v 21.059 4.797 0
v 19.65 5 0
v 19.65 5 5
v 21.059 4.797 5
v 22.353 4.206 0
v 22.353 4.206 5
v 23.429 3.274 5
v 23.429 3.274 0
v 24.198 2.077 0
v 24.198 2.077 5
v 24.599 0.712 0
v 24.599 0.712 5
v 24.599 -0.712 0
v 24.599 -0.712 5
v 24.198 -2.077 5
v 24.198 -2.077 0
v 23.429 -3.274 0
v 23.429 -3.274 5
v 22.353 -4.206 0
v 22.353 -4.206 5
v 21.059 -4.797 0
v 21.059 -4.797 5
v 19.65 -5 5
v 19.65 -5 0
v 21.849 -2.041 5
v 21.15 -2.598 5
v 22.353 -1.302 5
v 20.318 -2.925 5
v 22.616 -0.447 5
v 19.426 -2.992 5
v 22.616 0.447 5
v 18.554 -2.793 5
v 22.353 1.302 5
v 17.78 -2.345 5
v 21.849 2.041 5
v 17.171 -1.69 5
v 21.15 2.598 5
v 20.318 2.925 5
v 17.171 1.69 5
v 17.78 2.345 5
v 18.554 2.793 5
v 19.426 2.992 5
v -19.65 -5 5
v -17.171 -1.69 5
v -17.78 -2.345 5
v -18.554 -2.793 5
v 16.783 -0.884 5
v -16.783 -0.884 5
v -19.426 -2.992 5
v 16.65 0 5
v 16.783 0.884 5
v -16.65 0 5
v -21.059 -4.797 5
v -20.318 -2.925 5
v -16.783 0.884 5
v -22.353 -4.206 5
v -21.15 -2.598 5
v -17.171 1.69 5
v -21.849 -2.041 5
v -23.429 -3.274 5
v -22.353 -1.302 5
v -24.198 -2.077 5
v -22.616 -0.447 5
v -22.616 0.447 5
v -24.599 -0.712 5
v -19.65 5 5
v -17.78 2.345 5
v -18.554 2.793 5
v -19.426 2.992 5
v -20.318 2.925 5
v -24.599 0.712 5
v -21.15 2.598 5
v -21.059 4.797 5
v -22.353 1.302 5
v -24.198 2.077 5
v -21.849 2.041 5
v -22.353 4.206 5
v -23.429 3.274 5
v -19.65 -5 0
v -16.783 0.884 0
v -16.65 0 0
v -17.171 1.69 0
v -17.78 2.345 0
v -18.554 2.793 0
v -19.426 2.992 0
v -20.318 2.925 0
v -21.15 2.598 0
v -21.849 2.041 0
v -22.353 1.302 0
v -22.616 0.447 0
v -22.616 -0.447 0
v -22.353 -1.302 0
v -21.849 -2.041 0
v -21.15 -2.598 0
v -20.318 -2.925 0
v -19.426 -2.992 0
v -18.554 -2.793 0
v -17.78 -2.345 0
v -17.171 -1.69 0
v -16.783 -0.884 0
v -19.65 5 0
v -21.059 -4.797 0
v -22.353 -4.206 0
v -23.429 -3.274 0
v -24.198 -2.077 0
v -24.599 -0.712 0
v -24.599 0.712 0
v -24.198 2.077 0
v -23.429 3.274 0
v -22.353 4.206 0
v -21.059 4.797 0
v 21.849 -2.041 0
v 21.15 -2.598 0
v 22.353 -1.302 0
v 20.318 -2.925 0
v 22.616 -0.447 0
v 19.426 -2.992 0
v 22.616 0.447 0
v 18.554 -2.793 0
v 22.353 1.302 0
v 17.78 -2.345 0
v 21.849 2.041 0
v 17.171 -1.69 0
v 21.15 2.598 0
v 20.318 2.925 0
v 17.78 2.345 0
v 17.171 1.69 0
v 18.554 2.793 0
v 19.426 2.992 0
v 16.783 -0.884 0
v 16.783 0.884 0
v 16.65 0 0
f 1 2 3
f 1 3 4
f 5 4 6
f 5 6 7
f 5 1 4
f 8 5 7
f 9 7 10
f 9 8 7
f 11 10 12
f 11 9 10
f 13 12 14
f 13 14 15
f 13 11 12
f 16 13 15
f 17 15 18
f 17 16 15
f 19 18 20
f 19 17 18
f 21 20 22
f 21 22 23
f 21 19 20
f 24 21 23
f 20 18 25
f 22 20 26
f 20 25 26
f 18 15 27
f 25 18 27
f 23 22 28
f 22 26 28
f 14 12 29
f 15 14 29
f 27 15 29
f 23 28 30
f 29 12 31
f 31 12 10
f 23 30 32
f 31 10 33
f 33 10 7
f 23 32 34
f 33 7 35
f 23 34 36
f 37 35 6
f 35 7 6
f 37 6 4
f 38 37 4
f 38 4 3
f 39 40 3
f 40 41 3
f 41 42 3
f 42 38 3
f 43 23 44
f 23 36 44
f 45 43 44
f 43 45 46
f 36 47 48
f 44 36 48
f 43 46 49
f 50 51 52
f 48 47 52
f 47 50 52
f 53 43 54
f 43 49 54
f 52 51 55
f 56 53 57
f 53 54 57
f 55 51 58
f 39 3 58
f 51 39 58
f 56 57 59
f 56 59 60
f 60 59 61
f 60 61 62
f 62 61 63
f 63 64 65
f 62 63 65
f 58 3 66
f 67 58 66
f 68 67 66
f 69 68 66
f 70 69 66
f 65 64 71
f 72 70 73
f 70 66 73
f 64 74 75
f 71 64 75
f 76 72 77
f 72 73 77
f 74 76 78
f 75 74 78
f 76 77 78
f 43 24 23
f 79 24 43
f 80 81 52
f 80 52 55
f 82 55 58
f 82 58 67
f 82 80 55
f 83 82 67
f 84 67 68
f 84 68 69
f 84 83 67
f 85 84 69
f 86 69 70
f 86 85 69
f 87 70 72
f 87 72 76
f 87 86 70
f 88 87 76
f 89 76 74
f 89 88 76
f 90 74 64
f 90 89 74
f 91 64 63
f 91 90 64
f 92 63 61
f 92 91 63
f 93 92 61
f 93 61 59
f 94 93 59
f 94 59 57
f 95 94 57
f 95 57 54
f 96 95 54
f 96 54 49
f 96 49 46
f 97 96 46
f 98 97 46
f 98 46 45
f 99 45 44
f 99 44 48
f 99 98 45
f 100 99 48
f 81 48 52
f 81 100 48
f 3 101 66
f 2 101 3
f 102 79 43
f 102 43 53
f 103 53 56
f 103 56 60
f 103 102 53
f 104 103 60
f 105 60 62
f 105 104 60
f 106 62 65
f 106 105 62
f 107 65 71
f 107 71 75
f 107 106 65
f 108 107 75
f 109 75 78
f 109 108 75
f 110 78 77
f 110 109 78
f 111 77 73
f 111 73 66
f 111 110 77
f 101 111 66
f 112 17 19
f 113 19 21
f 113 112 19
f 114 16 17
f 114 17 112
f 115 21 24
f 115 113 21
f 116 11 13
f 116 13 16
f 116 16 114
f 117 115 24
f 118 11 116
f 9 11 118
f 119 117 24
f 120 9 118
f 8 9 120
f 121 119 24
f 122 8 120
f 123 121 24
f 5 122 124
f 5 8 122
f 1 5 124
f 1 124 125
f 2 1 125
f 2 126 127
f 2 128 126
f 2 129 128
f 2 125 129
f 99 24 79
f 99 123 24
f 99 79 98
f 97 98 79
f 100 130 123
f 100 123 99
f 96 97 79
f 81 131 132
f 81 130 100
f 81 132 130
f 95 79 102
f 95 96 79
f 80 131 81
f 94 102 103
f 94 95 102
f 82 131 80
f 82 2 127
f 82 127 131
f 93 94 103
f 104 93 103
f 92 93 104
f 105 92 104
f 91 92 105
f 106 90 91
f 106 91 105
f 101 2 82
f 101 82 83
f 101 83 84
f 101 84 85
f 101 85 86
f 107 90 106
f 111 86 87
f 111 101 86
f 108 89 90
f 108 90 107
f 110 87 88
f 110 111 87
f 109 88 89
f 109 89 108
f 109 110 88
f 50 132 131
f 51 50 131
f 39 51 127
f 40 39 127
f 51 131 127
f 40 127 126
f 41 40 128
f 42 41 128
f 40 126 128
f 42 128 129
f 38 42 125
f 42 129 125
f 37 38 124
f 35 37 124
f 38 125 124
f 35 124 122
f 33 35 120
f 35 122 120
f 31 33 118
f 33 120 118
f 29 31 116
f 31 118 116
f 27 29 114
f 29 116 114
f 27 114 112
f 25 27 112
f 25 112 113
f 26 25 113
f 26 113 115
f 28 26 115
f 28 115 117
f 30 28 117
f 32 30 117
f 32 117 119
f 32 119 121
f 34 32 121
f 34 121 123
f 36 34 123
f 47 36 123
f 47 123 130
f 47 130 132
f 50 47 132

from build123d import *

# Parameters (mm, degrees)
SKETCH1_R           = 3
BOSS_EXTRUDE1_DEPTH = 5
SKETCH2_R           = 3
CUT_EXTRUDE2_DEPTH  = 15


with BuildPart() as part:
    # Sketch1 → Boss-Extrude1 (new body)
    with BuildSketch(Plane.XY):
        with BuildLine():
            Line((19.65, -5), (-19.65, -5))
            ThreePointArc((-19.65, -5), (-24.65, 0), (-19.65, 5))
            Line((-19.65, 5), (19.65, 5))
            ThreePointArc((19.65, 5), (24.65, 0), (19.65, -5))
        make_face()
        with Locations((-19.65, 0)):
            Circle(SKETCH1_R, mode=Mode.SUBTRACT)
    extrude(amount=BOSS_EXTRUDE1_DEPTH)

    # Sketch2 → Cut-Extrude2 (cut)
    with BuildSketch(Plane(origin=(0, 0, 0), x_dir=(-1, 0, 0), z_dir=(0, 0, -1))):
        with Locations((-19.65, 0)):
            Circle(SKETCH2_R)
    extrude(amount=-CUT_EXTRUDE2_DEPTH, mode=Mode.SUBTRACT)


solid = part.part
